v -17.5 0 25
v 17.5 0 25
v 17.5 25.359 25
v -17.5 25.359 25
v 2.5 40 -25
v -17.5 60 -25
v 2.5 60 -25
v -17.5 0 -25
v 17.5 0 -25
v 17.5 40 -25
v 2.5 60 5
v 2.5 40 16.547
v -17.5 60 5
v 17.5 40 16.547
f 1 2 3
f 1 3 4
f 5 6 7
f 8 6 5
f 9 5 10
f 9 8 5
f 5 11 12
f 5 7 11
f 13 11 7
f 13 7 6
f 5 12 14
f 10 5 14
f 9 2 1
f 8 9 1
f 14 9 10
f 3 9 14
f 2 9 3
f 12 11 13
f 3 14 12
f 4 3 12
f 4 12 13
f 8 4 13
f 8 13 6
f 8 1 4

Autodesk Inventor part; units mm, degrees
ref_plane "YZ Plane" through (0, 0, 0) normal (1, 0, 0) x (0, 1, 0)
ref_plane "XZ Plane" through (0, 0, 0) normal (0, 1, 0) x (-1, 0, 0)
ref_plane "XY Plane" through (0, 0, 0) normal (0, 0, 1) x (1, 0, 0)
sketch "Esboço1" plane through (0, 0, 0) normal (0, 1, 0) x (-1, 0, 0)
  line L0 (17.5, -25) -> (-17.5, -25)
  line L1 (-17.5, -25) -> (-17.5, 25)
  line L2 (-17.5, 25) -> (17.5, 25)
  line L3 (17.5, 25) -> (17.5, -25)
  line L4 (17.5, -25) -> (-17.5, 25) construction
  line L5 (-17.5, -25) -> (17.5, 25) construction
  point P0 (0, 0)
  dimension "d0" = 35
  dimension "d1" = 50
extrude "Extrusão1" add sketch "Esboço1" along normal blind 60
chamfer "Chanfro1" distance 20 angle 60 1 edges at (0, 60, 25) measured on face at (5.8333, 60, 8.3333)
sketch "Esboço2" plane through (17.5, 0, -25) normal (0, 0, -1) x (-1, 0, 0)
  line L0 (0, 60) -> (15, 60)
  line L1 (15, 60) -> (15, 40)
  line L2 (15, 40) -> (0, 40)
  line L3 (0, 40) -> (0, 60)
  line L4 (35, 0) -> (35, 60) projected
  line L5 (0, 0) -> (35, 0) projected
  point P0 (17.5, 0)
  dimension "d7" = 20
  dimension "d8" = 40
extrude "Extrusão2" cut sketch "Esboço2" against normal through all
properties part number "3D Model"
